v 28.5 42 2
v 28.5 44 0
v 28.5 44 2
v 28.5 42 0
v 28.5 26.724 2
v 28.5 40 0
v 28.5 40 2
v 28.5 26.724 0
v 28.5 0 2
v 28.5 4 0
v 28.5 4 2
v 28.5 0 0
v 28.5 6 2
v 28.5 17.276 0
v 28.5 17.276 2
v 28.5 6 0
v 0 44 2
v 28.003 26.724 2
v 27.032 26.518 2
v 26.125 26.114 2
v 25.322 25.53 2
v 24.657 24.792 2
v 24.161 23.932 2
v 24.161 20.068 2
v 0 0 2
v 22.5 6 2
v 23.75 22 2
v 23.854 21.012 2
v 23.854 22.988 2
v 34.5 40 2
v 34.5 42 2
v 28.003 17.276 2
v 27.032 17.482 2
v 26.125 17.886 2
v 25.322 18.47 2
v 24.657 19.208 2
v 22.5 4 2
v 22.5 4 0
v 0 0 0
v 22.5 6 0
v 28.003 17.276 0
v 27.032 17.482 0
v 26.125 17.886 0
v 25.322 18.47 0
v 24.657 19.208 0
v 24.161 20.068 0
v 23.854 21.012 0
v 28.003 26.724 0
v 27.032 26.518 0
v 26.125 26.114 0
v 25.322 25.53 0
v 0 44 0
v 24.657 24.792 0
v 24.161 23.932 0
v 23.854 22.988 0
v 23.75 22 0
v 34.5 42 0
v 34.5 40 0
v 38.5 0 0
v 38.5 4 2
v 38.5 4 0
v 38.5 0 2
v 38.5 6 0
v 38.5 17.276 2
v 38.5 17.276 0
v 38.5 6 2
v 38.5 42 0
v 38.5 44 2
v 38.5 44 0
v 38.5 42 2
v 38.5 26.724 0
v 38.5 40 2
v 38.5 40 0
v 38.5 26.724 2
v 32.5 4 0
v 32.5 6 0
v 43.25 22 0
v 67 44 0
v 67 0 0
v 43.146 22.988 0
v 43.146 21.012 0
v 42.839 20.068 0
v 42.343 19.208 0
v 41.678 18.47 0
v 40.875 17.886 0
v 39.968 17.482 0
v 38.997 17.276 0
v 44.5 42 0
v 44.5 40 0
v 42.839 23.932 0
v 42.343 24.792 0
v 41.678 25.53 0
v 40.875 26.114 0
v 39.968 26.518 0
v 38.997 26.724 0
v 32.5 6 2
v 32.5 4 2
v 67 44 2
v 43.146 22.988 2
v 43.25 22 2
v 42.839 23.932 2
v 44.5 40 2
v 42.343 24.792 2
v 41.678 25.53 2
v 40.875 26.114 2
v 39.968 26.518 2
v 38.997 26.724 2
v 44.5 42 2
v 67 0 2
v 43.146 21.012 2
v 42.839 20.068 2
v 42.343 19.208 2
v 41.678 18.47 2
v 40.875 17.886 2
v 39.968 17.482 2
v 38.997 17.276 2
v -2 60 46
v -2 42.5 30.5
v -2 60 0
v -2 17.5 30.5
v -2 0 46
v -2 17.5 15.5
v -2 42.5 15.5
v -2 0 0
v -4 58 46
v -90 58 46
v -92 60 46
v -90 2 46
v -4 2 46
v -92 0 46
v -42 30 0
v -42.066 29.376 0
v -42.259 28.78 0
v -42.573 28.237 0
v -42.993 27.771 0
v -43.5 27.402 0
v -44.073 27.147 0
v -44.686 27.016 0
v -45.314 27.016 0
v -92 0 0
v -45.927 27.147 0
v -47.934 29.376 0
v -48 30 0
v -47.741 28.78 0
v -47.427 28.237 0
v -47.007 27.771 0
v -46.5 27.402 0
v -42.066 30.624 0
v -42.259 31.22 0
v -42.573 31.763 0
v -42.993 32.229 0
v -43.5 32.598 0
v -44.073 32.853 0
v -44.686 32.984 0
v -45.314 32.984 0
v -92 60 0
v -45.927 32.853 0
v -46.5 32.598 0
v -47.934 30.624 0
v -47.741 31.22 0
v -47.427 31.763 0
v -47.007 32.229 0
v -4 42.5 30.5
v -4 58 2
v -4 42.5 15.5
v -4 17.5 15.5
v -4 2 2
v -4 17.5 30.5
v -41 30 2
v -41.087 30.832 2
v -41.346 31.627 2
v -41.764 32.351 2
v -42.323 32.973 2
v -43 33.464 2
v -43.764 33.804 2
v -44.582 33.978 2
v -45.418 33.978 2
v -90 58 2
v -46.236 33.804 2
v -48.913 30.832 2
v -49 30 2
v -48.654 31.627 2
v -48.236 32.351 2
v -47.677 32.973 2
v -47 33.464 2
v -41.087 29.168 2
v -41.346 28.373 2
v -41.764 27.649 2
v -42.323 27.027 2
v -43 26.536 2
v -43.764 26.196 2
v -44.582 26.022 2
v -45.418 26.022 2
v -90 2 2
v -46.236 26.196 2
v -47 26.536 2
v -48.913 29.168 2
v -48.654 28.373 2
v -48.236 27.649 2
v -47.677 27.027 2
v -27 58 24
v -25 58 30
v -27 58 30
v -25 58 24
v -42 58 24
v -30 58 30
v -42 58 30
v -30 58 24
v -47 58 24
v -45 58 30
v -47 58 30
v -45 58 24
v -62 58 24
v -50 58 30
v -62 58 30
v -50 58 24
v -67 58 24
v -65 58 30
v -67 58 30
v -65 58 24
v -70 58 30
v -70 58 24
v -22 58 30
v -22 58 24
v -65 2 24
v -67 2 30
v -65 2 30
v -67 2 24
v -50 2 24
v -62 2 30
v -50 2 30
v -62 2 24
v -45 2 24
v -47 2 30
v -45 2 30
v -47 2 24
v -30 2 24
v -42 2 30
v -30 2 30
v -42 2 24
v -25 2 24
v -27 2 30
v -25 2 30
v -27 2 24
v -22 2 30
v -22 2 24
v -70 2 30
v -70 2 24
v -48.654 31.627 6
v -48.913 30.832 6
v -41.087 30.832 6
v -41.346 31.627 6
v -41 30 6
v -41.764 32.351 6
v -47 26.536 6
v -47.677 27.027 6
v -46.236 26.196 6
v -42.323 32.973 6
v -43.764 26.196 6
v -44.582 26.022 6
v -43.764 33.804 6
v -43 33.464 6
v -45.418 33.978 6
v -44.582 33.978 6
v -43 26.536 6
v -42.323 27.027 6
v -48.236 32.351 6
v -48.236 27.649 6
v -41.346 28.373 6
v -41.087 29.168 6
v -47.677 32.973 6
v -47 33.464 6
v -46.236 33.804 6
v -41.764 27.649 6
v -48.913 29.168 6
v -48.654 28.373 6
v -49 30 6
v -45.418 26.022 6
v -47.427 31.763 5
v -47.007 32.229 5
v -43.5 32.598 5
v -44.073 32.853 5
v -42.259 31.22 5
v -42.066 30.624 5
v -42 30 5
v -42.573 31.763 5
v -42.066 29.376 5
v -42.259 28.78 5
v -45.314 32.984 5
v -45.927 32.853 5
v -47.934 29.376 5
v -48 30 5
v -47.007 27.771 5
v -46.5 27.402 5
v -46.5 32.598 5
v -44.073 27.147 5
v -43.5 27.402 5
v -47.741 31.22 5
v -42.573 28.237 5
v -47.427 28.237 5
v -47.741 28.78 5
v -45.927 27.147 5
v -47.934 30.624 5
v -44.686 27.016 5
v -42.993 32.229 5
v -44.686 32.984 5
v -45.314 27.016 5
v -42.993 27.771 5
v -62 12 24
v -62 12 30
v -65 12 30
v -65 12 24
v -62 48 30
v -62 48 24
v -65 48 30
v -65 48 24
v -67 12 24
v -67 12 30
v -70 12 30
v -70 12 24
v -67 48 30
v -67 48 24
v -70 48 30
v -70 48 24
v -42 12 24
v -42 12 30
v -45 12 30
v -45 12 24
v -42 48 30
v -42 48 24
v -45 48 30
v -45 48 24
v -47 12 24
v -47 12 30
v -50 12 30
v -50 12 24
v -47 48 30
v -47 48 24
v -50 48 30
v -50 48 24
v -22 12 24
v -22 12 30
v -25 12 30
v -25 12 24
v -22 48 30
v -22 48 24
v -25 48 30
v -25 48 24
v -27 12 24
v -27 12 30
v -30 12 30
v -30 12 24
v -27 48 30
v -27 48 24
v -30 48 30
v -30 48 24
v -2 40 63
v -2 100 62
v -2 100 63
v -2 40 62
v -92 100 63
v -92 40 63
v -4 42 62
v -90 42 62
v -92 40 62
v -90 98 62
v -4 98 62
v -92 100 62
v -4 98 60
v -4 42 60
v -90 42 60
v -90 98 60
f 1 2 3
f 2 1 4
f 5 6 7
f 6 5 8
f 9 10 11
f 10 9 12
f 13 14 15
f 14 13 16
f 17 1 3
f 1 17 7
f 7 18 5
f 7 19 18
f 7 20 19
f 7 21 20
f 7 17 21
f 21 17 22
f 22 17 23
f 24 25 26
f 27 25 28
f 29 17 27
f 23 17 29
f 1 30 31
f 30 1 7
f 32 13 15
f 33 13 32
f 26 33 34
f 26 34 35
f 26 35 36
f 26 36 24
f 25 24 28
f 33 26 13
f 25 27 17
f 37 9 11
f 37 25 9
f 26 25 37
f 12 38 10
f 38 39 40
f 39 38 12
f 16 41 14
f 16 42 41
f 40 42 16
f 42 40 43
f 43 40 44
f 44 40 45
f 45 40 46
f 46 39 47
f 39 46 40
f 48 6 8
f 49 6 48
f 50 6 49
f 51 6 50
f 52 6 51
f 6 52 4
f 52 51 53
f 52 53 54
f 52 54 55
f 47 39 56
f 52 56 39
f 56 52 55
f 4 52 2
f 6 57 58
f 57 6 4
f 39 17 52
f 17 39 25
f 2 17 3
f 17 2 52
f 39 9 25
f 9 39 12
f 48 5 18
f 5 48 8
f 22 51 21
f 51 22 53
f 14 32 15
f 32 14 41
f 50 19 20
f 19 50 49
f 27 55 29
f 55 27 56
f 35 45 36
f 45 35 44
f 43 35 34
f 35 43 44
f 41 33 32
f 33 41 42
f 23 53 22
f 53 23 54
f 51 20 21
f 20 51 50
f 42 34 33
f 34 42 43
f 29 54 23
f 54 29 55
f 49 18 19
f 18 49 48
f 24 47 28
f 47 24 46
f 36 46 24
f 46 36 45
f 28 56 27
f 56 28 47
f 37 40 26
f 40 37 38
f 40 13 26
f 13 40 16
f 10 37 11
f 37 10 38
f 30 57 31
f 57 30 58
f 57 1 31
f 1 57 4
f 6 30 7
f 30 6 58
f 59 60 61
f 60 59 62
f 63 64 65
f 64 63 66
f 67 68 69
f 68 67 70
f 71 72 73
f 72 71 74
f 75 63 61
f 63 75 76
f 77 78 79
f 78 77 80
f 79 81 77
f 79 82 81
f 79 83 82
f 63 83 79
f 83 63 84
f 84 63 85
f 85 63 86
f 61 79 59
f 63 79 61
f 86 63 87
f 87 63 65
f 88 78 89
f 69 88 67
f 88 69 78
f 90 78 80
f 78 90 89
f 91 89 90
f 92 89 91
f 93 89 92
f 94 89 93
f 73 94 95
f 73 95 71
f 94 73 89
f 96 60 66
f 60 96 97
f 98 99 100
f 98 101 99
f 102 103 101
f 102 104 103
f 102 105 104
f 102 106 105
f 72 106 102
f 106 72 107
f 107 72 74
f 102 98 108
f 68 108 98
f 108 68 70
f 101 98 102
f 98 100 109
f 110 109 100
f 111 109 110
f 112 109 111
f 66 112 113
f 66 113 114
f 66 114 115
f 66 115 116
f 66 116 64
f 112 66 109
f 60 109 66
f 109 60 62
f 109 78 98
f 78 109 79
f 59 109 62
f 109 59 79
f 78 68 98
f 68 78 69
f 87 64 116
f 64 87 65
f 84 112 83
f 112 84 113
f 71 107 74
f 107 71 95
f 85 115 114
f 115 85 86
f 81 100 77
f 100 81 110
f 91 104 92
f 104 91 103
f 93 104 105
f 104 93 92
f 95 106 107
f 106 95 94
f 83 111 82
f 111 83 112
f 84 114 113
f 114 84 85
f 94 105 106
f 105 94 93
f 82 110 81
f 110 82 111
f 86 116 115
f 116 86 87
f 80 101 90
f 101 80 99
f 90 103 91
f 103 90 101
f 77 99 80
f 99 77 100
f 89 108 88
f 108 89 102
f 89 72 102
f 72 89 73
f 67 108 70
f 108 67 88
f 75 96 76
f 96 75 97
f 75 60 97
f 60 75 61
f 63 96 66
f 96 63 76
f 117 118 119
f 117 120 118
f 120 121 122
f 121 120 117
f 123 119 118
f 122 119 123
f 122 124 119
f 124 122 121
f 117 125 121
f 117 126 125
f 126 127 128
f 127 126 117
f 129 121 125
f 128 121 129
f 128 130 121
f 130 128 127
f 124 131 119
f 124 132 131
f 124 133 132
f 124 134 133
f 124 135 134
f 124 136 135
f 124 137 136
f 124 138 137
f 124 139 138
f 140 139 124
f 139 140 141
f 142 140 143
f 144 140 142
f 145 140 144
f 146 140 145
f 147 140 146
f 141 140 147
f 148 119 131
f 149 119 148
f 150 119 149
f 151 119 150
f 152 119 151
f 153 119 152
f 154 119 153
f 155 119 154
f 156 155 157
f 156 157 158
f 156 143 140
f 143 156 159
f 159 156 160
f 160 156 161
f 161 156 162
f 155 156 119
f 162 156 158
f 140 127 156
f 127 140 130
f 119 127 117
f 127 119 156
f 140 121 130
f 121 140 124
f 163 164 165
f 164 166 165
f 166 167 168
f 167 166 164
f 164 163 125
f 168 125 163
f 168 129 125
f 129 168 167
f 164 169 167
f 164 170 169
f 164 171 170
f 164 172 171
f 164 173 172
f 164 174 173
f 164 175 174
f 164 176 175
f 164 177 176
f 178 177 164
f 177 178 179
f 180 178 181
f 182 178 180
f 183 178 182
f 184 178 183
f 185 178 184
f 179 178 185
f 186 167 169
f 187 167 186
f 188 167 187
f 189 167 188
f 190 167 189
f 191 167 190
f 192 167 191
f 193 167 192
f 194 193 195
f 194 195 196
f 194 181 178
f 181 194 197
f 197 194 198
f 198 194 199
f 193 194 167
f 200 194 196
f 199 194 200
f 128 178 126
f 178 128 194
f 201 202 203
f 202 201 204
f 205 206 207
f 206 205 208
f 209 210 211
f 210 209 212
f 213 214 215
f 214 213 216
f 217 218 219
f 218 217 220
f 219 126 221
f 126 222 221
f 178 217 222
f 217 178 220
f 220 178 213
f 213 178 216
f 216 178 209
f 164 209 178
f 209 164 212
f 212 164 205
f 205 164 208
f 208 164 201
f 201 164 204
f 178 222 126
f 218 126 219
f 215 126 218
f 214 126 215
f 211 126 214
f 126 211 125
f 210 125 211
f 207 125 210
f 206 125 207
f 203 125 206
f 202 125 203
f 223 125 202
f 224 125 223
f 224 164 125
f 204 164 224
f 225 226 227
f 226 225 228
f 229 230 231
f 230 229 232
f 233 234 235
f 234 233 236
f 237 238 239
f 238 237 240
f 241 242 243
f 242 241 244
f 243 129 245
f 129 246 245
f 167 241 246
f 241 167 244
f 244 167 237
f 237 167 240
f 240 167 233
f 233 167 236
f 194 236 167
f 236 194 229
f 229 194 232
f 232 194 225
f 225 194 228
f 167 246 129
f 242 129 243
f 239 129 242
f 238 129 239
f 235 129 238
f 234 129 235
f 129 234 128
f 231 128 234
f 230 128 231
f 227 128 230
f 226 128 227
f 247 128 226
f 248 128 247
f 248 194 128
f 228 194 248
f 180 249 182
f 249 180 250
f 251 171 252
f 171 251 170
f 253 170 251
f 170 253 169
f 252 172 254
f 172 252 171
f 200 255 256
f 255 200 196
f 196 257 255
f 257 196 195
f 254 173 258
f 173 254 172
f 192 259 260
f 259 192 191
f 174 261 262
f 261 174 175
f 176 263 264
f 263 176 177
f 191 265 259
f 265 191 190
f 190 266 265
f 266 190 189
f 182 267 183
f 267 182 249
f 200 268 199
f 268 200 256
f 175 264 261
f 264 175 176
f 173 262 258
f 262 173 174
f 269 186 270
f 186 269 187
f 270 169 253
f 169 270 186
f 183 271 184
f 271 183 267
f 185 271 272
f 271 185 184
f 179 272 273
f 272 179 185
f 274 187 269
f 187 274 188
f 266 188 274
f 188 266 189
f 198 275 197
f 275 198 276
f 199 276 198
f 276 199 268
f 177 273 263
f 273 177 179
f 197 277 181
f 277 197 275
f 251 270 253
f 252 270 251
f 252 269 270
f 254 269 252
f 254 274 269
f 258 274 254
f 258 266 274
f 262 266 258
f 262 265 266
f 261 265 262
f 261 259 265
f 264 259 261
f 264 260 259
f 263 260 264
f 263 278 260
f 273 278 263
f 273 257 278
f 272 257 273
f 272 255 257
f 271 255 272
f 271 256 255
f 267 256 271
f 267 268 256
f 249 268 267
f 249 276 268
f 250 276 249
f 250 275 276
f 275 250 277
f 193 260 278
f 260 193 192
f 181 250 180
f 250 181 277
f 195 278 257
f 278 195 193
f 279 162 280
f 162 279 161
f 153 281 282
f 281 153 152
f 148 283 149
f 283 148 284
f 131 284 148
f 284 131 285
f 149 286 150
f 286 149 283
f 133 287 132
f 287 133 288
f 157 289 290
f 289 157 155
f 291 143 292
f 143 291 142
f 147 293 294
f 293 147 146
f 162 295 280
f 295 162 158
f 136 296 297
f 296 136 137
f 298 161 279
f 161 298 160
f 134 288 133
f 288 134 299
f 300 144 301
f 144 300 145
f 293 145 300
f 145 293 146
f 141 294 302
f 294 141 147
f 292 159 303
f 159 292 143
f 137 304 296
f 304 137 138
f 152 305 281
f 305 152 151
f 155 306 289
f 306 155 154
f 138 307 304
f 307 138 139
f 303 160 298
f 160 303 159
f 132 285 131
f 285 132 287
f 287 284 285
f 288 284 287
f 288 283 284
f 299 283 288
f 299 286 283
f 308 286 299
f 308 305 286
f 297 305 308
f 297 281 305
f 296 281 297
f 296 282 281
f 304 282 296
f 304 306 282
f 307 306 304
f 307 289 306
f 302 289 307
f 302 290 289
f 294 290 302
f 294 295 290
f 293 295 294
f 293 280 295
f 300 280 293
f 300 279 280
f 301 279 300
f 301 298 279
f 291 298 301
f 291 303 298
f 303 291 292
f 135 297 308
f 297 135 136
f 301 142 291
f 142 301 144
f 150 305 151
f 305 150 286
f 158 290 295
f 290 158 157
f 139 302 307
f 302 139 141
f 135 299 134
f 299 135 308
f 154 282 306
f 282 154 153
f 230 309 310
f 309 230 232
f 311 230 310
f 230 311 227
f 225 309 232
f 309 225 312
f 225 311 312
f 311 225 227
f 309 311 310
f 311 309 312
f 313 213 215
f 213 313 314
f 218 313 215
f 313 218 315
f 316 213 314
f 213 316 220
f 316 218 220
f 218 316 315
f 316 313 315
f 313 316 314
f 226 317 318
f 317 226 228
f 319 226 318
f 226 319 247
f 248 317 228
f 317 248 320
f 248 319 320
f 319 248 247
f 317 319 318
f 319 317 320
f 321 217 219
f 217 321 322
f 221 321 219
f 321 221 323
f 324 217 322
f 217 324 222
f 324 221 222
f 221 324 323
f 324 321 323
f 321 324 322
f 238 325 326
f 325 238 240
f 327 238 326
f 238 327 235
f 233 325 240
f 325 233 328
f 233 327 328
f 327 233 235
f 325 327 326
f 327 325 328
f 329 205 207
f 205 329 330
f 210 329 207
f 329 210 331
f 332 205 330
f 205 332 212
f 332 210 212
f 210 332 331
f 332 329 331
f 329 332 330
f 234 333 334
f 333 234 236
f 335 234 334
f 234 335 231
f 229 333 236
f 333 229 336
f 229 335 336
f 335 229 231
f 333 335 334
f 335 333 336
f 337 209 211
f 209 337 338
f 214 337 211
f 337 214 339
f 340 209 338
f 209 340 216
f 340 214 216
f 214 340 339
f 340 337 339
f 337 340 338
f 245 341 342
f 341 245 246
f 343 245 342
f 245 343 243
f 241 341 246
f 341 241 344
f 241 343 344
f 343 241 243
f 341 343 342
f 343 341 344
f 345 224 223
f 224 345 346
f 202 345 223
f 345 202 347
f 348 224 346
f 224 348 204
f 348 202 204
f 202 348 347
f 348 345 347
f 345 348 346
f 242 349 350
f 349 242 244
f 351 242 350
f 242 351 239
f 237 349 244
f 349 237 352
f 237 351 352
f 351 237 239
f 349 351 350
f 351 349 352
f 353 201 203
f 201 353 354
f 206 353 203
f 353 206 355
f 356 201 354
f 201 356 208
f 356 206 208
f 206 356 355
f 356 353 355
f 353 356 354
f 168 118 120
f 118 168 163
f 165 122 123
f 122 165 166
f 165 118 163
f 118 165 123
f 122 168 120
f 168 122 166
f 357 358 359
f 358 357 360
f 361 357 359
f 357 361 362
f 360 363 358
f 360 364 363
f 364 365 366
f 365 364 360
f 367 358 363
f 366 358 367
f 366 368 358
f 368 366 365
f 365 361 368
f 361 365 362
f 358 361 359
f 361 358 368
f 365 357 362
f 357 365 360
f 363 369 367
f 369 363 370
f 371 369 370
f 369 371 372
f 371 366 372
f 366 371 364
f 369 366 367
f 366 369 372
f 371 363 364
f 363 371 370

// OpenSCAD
$fn=30;
module lensholder1(){
difference(){
difference(){
cube([57/2,44,2]);
translate([57/2,44/2,0])cylinder(r=9.5/2,h=2);
}

translate([57/2-6,4,0])cube([6,2,2]);
}
translate([57/2,44-4,0])cube([6,2,2]);
}
module lensholder2(){
difference(){
difference(){
cube([57/2,44,2]);
translate([57/2,44/2,0])cylinder(r=9.5/2,h=2);
}

translate([57/2-6,2,0])cube([6,2,2]);
}
translate([57/2,44-6,0])cube([6,2,2]);
}
lensholder1();
translate([57+10,44,2])rotate(a=180,v=[1,0,0])mirror([1,0,0])lensholder2();

//box
module box(){

    difference(){
        union(){
            translate([-92,0,0])
            {
                difference(){
                    cube([90,60,46]);
                    translate([2,2,2])cube([86,56,44]);
                }
                   
            }
            translate([-45,30,0])cylinder(r=4,h=6);
        }
        translate([-45,30,0])cylinder(r=3,h=5);
    }
    translate([-90+20,2,2+22])slot(3,10,6,56-10,5);
    translate([-90+20+20,2,2+22])slot(3,10,6,56-10,5);
    translate([-90+20+20+20,2,2+22])slot(3,10,6,56-10,5);
    
    
}
difference(){
    box();
    translate([-92+88,30-12.5,23-7.5])cube([2,25,15]);
}

//lid
module lid(){
    translate([-92,40,0])
    {
        union(){
            translate([0,0,2])cube([90,60,1]);
            translate([2,2,0])cube([86,56,2]);
        }
    }
}
translate([0,0,60])lid();

module slot(l,b,h,s,D){
    
    cube([l,b,h]);
    translate([0,s,0])cube([l,b,h]);
    cube([l,b,h]);
    translate([D,0,0]){
        cube([l,b,h]);
        translate([0,s,0])cube([l,b,h]);
    }
    
}



/*
lensholder();
translate([70,44,2])rotate(a=180,v=[1,0,0])mirror([1,0,0])lensholder();
*/

/*
scale([1,1,5]){
    cube([1,1,1/5], center=true);
}


union(){
    cube([5,5,1]); 
    cylinder(r=1,h=1);
}

intersection(){
    cube([5,5,1]); 
    cylinder(r=1,h=1);
}
difference(){
    cube([5,5,1]); 
    cylinder(r=1,h=1);
}

cube([5,5,1]);
translate([2.5,2.5,-0.5]){
    cylinder(r=1,h=2);
}



module plate(){
difference(){
cube([5,5,1]);
translate([2.5,2.5,-0.5]){
    cylinder(r=1,h=2);
}
}
}
rotate(a=0,v=[1,0,0])translate([-2.5,-2.5,-0.5]) plate();



module plate(l,w,t){
difference(){
cube([l,w,t]);
translate([l/2,w/2,0]){
    cylinder(r=0.5,h=t, $fn=100);
}
}
}
plate(10,10,2);




module plate(l,w,t){
difference(){
cube([l,w,t]);
translate([l/2,w/2,0]){
    cylinder(r=0.5,h=t, $fn=100);
}
}
}

module bracket(l,w,t){
    rotate(a=90,v=[1,0,0])plate(l,w,t);
    plate(l,w,t);
}

bracket(20,20,4);

*/
